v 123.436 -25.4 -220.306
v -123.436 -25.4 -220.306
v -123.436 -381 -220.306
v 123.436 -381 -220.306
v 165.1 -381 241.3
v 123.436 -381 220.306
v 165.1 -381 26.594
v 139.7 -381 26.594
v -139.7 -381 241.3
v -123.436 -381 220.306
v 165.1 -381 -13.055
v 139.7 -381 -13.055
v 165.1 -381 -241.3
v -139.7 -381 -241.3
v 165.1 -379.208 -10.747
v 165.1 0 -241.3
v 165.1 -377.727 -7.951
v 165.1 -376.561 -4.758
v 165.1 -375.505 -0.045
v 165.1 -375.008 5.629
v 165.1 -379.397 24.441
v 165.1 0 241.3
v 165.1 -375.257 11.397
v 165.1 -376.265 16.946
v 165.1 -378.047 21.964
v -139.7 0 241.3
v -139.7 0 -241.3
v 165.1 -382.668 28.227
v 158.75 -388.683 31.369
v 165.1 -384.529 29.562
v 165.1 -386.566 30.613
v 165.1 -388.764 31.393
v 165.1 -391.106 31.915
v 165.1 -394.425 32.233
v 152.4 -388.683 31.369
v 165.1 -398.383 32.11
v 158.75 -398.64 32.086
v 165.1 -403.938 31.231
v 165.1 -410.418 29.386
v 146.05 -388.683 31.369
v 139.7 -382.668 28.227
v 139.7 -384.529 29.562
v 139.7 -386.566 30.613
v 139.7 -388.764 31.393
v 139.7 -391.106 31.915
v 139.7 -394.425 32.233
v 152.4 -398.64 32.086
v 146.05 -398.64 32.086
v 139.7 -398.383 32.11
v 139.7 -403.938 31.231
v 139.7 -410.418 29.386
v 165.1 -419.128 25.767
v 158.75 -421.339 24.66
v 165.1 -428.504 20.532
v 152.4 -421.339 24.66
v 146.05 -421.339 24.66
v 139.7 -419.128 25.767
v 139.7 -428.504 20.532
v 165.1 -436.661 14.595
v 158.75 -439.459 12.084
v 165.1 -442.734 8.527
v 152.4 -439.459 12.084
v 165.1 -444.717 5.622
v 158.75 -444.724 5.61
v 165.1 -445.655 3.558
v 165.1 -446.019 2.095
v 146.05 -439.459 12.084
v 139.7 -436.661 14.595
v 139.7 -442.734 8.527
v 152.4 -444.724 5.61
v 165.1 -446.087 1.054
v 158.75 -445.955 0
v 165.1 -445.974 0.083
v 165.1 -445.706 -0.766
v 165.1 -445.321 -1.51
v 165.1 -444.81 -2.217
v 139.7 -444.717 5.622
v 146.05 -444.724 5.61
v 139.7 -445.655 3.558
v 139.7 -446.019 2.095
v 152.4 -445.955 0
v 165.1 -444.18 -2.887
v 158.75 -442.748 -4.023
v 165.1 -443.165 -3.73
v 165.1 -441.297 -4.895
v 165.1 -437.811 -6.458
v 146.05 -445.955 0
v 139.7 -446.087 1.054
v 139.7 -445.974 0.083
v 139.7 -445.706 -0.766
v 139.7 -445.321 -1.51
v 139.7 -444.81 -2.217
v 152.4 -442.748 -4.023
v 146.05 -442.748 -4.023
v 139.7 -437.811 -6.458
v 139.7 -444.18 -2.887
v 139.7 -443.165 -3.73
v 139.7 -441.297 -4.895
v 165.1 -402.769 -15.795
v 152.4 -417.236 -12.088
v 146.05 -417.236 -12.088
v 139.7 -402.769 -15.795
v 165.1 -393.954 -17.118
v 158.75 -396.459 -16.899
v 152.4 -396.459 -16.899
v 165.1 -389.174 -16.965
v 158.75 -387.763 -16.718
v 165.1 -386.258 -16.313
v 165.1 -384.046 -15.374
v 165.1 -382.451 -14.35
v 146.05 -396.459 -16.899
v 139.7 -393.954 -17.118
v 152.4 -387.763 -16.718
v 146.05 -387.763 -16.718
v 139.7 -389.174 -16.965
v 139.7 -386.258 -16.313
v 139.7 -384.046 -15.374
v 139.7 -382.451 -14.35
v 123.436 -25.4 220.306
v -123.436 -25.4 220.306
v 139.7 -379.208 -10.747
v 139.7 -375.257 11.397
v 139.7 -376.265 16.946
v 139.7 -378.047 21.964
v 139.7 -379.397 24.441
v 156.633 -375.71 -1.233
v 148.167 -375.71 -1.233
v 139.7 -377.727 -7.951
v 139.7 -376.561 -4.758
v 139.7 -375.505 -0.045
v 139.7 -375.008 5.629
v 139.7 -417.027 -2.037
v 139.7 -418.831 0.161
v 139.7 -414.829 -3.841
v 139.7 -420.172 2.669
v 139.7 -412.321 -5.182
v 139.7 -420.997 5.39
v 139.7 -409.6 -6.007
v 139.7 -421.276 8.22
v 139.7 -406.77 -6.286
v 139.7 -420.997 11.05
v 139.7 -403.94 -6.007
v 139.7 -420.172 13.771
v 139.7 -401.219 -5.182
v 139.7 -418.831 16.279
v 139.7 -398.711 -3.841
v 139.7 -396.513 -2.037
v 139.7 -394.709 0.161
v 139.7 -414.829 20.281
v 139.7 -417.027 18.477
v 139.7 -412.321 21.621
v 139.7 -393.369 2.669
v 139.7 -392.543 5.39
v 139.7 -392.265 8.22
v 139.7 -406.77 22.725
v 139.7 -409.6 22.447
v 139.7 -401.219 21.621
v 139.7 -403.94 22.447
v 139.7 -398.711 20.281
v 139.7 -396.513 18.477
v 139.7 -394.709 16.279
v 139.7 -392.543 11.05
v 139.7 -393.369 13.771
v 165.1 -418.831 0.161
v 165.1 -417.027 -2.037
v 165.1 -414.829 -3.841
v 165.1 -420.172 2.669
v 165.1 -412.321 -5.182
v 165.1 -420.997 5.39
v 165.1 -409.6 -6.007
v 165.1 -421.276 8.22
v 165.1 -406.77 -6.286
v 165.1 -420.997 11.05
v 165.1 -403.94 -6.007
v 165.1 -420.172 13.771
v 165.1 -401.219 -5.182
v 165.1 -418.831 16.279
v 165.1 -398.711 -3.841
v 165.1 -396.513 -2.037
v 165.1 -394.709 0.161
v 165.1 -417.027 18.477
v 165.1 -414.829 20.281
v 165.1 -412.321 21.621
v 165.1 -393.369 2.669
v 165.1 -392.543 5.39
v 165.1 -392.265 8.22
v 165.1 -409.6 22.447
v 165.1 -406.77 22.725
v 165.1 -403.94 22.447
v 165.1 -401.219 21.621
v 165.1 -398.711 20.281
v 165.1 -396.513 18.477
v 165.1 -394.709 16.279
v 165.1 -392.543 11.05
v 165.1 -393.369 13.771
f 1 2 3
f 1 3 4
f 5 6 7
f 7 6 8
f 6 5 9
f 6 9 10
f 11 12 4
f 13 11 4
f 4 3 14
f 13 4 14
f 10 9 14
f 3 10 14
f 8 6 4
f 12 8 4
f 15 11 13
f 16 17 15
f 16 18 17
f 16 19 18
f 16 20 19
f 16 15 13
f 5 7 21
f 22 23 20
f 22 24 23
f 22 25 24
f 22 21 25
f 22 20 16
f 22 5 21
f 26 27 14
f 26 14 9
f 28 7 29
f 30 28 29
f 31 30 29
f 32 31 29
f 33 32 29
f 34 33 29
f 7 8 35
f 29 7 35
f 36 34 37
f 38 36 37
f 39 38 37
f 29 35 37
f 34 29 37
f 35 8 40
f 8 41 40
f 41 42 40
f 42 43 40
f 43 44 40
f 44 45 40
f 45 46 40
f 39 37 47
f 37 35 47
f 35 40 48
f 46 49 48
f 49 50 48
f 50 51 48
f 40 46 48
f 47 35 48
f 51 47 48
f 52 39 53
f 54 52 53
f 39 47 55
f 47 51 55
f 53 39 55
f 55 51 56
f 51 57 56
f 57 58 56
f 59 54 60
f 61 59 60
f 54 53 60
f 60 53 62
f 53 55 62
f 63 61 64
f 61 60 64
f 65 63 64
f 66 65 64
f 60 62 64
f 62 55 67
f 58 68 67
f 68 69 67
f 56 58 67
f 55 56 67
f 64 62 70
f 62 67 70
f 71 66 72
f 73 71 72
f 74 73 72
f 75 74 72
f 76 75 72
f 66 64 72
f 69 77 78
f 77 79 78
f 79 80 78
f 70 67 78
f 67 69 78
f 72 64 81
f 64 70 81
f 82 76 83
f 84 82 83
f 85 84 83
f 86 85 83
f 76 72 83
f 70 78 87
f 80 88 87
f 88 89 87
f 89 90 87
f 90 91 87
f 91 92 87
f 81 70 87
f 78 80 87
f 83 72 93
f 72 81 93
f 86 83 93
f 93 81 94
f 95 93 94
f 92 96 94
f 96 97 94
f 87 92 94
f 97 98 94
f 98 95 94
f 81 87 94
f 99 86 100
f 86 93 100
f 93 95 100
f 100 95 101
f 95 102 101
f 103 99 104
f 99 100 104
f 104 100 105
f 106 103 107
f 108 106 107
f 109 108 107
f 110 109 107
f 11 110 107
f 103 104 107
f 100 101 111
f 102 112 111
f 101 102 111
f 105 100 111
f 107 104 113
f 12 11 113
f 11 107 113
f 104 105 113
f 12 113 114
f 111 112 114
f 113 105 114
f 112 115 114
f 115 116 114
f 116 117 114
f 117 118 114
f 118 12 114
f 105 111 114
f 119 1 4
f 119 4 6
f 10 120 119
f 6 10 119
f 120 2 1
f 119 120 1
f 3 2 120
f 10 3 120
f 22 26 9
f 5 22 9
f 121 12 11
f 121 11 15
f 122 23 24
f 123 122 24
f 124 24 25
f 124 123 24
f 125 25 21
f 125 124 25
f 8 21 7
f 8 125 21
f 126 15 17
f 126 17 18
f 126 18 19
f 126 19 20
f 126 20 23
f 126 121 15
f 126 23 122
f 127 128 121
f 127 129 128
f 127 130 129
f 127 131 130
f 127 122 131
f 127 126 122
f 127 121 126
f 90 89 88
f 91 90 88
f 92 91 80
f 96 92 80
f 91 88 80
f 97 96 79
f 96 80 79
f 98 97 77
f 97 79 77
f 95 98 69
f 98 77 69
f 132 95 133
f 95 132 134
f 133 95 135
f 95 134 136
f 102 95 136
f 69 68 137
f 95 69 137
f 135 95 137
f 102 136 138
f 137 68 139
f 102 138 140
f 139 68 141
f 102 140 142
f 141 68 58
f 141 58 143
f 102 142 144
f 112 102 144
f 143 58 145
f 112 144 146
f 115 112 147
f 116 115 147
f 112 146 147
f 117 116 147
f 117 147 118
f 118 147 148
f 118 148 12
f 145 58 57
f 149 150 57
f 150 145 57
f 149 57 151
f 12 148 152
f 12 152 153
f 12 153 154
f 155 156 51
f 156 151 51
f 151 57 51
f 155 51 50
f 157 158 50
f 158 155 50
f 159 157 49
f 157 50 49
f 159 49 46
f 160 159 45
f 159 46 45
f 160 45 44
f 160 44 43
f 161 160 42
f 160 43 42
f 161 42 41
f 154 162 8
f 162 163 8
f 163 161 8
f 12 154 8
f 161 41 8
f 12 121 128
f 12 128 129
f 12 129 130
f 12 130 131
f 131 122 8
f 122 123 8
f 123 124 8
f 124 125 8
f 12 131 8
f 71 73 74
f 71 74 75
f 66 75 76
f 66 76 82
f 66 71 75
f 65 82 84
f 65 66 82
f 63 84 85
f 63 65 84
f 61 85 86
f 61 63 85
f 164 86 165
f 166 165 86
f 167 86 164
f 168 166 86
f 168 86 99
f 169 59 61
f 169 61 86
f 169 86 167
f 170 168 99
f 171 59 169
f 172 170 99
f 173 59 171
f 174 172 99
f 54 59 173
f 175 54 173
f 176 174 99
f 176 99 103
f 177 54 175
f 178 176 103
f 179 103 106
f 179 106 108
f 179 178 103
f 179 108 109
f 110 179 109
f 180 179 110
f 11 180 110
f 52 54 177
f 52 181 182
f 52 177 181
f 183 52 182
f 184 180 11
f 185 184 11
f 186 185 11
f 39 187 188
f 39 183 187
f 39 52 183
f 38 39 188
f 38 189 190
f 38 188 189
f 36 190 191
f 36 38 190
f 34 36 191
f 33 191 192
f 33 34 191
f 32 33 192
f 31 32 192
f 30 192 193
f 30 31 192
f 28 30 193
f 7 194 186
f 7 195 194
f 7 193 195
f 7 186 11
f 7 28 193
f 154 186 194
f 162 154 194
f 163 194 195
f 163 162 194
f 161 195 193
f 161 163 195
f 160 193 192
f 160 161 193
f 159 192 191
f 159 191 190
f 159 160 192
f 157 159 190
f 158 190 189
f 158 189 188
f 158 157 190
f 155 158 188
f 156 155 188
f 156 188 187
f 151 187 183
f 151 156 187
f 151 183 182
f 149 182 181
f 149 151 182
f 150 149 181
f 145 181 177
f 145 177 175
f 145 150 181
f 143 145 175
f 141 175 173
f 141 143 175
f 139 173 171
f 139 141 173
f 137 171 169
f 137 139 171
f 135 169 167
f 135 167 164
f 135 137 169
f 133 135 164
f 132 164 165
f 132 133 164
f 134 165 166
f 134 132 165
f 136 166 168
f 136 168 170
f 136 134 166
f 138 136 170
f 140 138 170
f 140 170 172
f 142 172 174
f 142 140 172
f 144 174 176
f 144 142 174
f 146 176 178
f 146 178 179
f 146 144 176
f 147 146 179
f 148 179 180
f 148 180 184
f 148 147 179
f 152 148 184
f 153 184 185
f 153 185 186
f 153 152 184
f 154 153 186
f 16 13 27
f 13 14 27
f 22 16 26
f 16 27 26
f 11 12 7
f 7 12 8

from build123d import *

# Parameters (mm, degrees)
F0_W     = 279.4
F0_H     = 482.6
F0_W_2   = 246.8713670969
F0_H_2   = 440.6119585037
F1_DEPTH = 381
F2_DEPTH = 25.4
F3_R     = 14.505640819
F4_DEPTH = 25.4


with BuildPart() as f1:
    # F0 (on Front) → F1 (new body)
    with BuildSketch(Plane.XZ):
        Rectangle(F0_W, F0_H)
        Rectangle(F0_W_2, F0_H_2, mode=Mode.SUBTRACT)
    extrude(amount=F1_DEPTH)

    # F0 (on Front) → F2 (join)
    with BuildSketch(Plane.XZ):
        Rectangle(F0_W_2, F0_H_2)
    extrude(amount=F2_DEPTH)

    # F3 (on face) → F4 (join)
    with BuildSketch(Plane.YZ.offset(139.7)):
        with BuildLine():
            Line((-381, -13.0550665781), (-381, 26.5936553478))
            add(Edge.make_bspline(
                [(-381, 26.5936553478), (-389.2777418759, 36.0344145926), (-422.144810442, 29.1111932624), (-459.0503806055, -3.6870125897), (-415.8766281026, -11.1937380865), (-388.4597489706, -20.8454898508), (-381, -13.0550665781)],
                knots=[0, 0, 0, 0, 0.2107256672, 0.4064612968, 0.5915610408, 0.7912039011, 0.7912039011, 0.7912039011, 0.7912039011], degree=3))
        make_face()
        with Locations((-406.7702889442, 8.2198567688)):
            Circle(F3_R, mode=Mode.SUBTRACT)
        with BuildLine():
            Line((-381, 241.3), (-381, 26.5936553478))
            add(Edge.make_bspline(
                [(-381, -13.0550665781), (-373.1982359839, -4.9074674835), (-372.7980555741, 17.2393430457), (-381, 26.5936553478)],
                knots=[0.7912039011, 0.7912039011, 0.7912039011, 0.7912039011, 1, 1, 1, 1], degree=3))
            Line((-381, -13.0550665781), (-381, -241.3))
            Line((-381, -241.3), (0, -241.3))
            Line((0, -241.3), (0, 241.3))
            Line((0, 241.3), (-381, 241.3))
        make_face()
    extrude(amount=F4_DEPTH)


solid = f1.part
